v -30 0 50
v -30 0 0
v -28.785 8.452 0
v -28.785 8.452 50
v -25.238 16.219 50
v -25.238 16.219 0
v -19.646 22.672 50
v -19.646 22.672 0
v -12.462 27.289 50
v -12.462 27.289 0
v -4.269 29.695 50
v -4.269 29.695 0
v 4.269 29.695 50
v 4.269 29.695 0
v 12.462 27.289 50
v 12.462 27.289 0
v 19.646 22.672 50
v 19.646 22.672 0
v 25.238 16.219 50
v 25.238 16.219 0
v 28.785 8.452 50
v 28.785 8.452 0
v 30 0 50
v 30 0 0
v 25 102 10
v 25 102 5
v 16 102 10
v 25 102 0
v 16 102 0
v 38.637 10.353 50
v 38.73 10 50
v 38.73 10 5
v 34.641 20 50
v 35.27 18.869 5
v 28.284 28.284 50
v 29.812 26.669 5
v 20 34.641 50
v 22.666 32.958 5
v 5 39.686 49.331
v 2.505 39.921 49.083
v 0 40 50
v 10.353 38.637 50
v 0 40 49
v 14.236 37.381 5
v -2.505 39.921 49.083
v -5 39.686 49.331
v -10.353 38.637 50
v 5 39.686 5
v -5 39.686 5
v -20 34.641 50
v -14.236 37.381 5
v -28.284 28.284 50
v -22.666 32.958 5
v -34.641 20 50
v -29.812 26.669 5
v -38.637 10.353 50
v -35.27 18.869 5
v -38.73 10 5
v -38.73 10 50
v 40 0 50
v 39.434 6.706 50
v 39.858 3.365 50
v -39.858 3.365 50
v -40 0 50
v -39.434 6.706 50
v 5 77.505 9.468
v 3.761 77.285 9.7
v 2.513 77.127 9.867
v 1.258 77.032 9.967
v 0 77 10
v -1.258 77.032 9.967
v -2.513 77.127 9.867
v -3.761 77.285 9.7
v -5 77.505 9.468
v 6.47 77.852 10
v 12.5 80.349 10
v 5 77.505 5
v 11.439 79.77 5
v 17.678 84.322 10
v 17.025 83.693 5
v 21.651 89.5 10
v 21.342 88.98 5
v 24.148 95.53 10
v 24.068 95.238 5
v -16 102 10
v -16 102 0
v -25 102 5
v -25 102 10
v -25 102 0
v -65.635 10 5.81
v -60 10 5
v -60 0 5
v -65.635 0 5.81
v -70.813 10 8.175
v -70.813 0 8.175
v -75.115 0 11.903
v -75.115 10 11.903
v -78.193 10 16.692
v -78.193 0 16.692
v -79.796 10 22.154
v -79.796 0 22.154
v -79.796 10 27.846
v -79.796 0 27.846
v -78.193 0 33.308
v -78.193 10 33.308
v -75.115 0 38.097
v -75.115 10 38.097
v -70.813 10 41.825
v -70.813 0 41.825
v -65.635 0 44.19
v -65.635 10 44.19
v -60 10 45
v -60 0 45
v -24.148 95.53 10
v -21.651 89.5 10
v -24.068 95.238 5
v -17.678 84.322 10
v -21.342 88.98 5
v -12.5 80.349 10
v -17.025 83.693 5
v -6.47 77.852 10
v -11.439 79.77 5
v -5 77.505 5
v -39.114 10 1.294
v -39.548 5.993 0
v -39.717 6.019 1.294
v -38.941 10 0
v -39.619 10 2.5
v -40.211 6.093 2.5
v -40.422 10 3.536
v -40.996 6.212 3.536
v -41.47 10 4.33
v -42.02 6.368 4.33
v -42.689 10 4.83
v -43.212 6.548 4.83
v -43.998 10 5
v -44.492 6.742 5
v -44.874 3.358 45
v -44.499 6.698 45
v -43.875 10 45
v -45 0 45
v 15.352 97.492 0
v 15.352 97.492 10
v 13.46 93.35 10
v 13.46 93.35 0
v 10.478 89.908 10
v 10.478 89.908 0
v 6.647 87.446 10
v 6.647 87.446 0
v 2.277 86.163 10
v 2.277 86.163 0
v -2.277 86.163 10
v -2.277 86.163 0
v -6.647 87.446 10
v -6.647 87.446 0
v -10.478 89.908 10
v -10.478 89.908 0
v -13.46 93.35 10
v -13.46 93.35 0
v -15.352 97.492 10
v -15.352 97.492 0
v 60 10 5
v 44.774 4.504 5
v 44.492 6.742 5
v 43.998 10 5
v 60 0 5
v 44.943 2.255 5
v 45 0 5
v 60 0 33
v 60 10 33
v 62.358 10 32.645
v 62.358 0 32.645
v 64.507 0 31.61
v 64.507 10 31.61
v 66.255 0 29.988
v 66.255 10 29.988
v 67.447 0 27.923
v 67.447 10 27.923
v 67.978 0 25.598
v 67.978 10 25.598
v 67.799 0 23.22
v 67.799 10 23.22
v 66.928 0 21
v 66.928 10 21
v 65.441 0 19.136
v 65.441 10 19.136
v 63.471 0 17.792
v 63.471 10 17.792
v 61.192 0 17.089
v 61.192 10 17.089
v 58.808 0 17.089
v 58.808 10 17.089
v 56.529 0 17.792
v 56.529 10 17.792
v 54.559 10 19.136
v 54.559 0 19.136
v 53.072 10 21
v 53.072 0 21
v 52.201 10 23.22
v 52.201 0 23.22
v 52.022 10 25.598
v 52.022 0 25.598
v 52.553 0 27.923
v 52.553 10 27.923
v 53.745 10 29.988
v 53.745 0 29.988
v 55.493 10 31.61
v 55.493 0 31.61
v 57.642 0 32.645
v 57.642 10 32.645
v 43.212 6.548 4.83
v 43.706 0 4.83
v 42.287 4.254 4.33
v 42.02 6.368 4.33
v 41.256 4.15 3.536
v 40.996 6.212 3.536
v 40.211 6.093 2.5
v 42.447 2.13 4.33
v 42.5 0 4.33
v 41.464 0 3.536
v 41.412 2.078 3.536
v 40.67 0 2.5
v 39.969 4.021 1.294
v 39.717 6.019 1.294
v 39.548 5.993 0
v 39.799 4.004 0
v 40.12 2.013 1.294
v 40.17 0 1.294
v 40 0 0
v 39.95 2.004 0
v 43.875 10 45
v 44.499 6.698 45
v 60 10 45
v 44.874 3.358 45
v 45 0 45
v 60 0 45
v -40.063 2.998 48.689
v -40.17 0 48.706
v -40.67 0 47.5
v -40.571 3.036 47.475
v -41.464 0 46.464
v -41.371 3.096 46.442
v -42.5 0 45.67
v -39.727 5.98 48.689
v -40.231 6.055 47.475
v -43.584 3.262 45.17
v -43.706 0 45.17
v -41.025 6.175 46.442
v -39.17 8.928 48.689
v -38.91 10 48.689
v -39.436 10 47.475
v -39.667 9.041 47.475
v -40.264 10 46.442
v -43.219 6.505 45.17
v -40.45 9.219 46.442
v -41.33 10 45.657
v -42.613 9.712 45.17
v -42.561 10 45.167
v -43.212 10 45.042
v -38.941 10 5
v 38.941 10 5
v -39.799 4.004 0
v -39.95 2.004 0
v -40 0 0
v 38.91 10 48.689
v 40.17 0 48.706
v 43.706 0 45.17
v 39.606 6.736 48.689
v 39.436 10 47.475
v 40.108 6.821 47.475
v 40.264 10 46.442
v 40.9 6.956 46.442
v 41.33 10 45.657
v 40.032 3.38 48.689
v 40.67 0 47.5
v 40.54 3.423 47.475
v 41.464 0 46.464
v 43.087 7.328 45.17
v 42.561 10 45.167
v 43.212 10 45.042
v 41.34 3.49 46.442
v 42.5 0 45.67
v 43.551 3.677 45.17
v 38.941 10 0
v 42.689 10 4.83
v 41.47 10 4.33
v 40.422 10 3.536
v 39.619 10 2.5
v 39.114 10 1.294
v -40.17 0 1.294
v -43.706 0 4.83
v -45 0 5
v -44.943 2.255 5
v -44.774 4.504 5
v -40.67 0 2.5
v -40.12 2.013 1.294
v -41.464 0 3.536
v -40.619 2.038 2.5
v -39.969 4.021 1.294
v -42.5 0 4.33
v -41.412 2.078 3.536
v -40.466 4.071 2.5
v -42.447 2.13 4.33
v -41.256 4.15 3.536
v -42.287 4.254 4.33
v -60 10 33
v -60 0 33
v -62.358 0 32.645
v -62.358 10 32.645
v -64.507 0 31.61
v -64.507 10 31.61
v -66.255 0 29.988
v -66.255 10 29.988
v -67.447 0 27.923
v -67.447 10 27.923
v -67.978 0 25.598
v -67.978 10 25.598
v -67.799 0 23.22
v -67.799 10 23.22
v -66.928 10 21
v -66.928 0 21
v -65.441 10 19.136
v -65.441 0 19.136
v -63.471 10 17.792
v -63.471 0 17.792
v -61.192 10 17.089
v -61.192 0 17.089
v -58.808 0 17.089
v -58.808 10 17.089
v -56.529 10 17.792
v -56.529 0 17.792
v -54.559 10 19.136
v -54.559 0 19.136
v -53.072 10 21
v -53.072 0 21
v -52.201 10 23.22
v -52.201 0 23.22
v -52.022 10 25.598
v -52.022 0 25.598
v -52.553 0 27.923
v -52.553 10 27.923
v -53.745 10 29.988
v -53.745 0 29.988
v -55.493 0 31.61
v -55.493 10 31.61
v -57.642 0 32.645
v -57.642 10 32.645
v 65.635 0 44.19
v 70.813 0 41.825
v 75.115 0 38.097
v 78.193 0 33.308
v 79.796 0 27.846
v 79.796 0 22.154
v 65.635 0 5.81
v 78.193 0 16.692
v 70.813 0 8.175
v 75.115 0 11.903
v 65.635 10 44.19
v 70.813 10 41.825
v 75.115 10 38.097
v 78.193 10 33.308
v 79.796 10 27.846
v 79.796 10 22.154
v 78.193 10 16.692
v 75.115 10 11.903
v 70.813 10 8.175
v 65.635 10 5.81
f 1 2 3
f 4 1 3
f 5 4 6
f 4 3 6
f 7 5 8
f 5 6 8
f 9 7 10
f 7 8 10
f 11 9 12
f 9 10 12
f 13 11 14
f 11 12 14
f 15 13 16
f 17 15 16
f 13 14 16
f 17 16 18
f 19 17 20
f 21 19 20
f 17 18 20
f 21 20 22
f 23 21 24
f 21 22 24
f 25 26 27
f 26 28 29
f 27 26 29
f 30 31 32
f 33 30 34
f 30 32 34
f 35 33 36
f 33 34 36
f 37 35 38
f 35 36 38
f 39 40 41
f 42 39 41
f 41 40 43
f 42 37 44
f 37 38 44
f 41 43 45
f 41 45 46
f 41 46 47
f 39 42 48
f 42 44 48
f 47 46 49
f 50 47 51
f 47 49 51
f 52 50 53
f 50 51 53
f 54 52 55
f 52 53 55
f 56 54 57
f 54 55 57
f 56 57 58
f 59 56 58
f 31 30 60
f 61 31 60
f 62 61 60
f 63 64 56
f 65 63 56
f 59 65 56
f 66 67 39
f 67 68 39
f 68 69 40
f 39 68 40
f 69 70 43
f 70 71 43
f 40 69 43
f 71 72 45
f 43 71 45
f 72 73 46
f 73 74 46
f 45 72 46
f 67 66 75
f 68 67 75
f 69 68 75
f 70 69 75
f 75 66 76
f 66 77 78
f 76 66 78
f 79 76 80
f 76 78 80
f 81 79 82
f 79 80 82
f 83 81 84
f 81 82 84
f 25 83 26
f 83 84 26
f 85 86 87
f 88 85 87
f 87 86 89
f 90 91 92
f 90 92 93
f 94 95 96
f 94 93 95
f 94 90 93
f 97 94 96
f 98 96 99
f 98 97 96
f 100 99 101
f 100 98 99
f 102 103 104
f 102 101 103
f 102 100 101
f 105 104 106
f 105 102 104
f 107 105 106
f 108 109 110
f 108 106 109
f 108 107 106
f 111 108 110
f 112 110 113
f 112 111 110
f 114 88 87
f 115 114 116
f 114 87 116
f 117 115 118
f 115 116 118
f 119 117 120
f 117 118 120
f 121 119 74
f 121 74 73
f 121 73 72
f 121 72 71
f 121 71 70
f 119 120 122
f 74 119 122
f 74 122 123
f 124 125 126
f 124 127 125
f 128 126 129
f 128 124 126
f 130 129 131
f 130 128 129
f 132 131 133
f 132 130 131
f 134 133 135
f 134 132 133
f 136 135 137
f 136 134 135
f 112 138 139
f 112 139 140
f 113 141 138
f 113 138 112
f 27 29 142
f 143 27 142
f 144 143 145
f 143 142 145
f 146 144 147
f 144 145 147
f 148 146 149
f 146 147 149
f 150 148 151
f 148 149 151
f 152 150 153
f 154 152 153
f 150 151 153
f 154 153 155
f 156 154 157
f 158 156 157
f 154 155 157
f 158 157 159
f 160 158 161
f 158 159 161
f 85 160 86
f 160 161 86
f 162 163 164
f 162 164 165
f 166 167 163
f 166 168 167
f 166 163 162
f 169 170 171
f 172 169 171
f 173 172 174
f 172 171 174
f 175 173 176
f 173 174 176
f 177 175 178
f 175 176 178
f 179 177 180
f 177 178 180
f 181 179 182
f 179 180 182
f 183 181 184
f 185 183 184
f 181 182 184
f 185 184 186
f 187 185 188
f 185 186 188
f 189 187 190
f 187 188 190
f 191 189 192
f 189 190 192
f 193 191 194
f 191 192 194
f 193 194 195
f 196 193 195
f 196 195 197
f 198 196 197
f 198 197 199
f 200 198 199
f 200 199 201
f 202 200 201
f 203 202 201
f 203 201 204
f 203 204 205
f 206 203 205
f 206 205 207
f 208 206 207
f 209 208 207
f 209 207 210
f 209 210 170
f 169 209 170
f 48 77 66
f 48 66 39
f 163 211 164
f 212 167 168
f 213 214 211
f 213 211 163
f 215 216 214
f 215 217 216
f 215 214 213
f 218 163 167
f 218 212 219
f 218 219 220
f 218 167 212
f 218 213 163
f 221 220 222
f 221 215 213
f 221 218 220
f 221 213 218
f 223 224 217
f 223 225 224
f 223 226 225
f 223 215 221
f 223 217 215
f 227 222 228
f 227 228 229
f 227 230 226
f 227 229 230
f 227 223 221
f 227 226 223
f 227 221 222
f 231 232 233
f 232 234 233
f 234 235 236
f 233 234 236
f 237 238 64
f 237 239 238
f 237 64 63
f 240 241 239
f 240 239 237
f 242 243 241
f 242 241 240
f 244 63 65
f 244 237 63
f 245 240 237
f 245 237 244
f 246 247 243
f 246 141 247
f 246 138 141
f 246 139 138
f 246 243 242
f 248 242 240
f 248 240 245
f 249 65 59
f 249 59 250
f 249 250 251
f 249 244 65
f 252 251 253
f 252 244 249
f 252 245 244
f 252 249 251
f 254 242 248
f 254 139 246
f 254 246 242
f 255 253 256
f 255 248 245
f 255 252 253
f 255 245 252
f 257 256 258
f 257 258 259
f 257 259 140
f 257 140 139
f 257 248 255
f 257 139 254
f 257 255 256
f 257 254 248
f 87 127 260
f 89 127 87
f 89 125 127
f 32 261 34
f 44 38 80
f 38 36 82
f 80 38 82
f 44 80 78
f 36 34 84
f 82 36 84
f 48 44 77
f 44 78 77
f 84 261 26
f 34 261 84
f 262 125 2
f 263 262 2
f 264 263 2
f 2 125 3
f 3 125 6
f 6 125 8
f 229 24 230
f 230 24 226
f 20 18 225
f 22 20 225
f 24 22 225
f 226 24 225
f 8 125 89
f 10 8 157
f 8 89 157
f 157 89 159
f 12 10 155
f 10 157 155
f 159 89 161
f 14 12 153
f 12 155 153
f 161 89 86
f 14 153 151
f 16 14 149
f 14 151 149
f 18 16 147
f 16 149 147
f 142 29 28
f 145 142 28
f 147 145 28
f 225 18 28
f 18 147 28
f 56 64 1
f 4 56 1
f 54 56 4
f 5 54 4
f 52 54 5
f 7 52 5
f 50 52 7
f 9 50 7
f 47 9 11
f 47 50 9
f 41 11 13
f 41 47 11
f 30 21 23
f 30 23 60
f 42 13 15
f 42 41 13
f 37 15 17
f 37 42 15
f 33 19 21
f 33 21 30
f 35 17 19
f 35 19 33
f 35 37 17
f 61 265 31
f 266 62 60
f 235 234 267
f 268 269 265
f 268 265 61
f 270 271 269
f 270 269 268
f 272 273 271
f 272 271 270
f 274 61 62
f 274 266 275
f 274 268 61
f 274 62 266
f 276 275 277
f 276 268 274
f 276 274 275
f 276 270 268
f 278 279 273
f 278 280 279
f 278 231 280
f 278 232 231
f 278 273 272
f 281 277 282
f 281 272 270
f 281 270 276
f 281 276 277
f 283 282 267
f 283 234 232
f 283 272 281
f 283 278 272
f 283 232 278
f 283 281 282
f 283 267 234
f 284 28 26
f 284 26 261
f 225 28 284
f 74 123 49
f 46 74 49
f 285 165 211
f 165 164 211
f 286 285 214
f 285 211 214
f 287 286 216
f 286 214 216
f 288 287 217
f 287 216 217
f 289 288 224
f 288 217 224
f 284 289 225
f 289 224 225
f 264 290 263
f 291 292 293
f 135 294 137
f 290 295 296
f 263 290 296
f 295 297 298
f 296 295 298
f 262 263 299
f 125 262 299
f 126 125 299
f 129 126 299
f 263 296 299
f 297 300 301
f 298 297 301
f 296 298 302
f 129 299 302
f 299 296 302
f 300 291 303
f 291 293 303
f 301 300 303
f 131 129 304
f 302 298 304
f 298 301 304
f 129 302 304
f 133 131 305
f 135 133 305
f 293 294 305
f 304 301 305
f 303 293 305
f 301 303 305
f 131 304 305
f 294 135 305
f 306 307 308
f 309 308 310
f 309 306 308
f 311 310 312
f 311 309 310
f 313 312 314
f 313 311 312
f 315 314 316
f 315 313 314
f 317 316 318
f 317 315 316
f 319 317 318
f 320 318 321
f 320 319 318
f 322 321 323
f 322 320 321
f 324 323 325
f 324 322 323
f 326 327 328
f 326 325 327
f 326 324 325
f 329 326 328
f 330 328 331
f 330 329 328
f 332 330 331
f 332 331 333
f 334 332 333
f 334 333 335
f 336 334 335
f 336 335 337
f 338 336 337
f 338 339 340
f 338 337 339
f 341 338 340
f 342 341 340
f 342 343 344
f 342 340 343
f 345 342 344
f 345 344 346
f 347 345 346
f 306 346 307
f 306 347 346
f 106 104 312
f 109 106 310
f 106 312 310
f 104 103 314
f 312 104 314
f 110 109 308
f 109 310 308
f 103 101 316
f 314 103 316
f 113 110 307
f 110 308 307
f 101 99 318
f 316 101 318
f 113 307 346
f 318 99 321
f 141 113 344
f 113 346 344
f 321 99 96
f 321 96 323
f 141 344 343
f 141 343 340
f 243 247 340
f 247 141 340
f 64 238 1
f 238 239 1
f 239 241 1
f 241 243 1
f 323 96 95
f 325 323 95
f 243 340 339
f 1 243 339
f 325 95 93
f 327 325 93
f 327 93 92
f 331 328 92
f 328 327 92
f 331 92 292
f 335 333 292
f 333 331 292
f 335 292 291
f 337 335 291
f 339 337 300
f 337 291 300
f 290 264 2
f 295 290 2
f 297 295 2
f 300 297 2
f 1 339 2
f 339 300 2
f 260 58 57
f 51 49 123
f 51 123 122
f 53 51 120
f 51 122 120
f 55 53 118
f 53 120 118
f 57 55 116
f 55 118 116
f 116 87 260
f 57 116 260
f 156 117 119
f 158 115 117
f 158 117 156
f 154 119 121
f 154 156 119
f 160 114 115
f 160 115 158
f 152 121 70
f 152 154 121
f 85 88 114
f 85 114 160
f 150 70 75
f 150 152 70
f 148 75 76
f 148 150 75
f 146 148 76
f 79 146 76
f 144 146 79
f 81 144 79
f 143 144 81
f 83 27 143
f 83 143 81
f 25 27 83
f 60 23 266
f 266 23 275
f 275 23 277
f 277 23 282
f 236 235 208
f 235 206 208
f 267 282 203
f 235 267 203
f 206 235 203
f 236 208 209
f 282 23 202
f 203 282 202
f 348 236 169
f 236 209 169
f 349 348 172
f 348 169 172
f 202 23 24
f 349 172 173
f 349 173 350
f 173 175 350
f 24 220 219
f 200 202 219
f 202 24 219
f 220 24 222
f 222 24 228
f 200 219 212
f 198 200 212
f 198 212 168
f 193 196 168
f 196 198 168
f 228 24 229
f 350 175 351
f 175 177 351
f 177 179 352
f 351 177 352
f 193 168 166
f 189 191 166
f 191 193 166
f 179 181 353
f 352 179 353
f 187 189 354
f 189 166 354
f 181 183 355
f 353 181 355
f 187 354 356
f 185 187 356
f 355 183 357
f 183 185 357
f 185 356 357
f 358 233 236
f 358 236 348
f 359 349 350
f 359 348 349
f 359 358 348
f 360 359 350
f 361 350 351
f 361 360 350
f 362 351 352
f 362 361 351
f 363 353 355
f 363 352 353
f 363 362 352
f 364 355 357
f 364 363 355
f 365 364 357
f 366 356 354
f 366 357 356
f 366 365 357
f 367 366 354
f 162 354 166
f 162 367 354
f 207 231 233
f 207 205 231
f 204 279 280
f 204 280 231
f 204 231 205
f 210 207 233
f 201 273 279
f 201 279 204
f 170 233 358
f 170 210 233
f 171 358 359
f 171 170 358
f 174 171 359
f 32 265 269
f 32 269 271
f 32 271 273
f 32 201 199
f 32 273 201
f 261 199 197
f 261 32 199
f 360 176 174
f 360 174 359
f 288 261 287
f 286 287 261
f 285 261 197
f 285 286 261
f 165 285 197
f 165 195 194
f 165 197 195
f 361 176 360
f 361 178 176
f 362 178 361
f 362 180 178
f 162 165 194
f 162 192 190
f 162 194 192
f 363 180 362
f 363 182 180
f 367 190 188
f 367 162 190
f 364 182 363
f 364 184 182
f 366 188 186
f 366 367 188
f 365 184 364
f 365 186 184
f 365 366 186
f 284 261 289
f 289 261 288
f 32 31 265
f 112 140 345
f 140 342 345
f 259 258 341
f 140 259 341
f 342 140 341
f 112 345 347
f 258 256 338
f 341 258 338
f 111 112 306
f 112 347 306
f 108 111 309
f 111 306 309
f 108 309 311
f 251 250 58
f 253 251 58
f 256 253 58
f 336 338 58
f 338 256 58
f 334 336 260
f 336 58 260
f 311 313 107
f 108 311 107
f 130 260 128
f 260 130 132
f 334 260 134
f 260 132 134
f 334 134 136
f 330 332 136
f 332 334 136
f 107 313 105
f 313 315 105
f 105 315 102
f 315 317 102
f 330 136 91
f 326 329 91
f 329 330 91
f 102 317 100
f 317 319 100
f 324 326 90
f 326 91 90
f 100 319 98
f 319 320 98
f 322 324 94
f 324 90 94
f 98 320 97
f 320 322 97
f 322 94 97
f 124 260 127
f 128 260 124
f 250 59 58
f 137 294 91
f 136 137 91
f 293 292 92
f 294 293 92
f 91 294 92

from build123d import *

# Parameters (mm, degrees)
EXTRUDE_THIN1_DEPTH         = 50
BOSS_EXTRUDE1_DEPTH         = 5
EXTRUDE_THIN3_DEPTH         = 5
EXTRUDE_THIN3_DEPTH_BACK    = 5
RIB6_REACH                  = 122.433
SKETCH4_WALL_W              = 296.6238277
SKETCH4_WALL_H              = 10
SKETCH5_W                   = 50
SKETCH5_H                   = 40
BOSS_EXTRUDE2_DEPTH         = 10
FILLET1_RADIUS              = 20
FILLET1_LENGTH              = 10
SKETCH6_R                   = 8
CUT_EXTRUDE1_DEPTH          = 132.77253128
FILLET2_R                   = 5
FILLET1_OF_MIRROR1_2_RADIUS = 20
FILLET1_OF_MIRROR1_2_LENGTH = 10
FILLET2_OF_MIRROR1_R        = 5


with BuildPart() as part:
    # Sketch1 → Extrude-Thin1 (new body)
    with BuildSketch(Plane.XY):
        with BuildLine():
            ThreePointArc((40, 0), (0, 40), (-40, 0))
            Line((-40, 0), (-30, 0))
            ThreePointArc((-30, 0), (0, 30), (30, 0))
            Line((30, 0), (40, 0))
        make_face()
    extrude(amount=EXTRUDE_THIN1_DEPTH)

    # Sketch2 → Boss-Extrude1 (add)
    with BuildSketch(Plane.XY):
        with BuildLine():
            Line((-30, 0), (-40, 0))
            ThreePointArc((-40, 0), (-39.886965034, 3.004999227), (-39.548498982, 5.993014955))
            Line((-39.548498982, 5.993014955), (-25, 102))
            ThreePointArc((-25, 102), (0, 77), (25, 102))
            Line((25, 102), (39.548498982, 5.993014955))
            ThreePointArc((39.548498982, 5.993014955), (39.886965034, 3.004999227), (40, 0))
            Line((40, 0), (30, 0))
            ThreePointArc((30, 0), (0, 30), (-30, 0))
        make_face()
    extrude(amount=BOSS_EXTRUDE1_DEPTH)

    # Sketch3 → Extrude-Thin3 (add, two sides: drawn at the far end of the back side and taken through both)
    with BuildSketch(Plane.XY.offset(5).offset(-EXTRUDE_THIN3_DEPTH_BACK)):
        with BuildLine():
            ThreePointArc((-25, 102), (0, 77), (25, 102))
            Line((25, 102), (16, 102))
            ThreePointArc((16, 102), (0, 86), (-16, 102))
            Line((-16, 102), (-25, 102))
        make_face()
    extrude(amount=EXTRUDE_THIN3_DEPTH + EXTRUDE_THIN3_DEPTH_BACK)

    # Sketch4 wall → Rib6 (add, up to next)
    with BuildSketch(Plane(origin=(0, 58.5, 29.5), x_dir=(0, -0.688260431919, 0.725463698509), z_dir=(0, -0.725463698509, -0.688260431919)), mode=Mode.PRIVATE) as rib6_sk1:
        Rectangle(SKETCH4_WALL_W, SKETCH4_WALL_H)
    rib6_tool1 = extrude(rib6_sk1.sketch, amount=RIB6_REACH, mode=Mode.PRIVATE) - part.part
    add(rib6_tool1.solids().sort_by_distance((0, 58.5, 29.5))[0])

    # Sketch5 → Boss-Extrude2 (add)
    with BuildSketch(Plane(origin=(0, 0, 0), x_dir=(1, 0, 0), z_dir=(0, 1, 0))):
        with Locations((55, -25)):
            Rectangle(SKETCH5_W, SKETCH5_H)
    boss_extrude2 = extrude(amount=BOSS_EXTRUDE2_DEPTH)

    # Fillet1: full round fillet: the end face becomes a half cylinder, R = half its width
    fillet1_face = Plane((80, 5, 25), x_dir=(0, 1, 0), z_dir=(1, 0, 0))  # on the end face: x along it, z out of the body
    fillet1_slab = fillet1_face.offset(-FILLET1_RADIUS / 2) * Box(FILLET1_LENGTH, 2 * FILLET1_RADIUS, FILLET1_RADIUS, mode=Mode.PRIVATE)  # the body's end, R deep
    fillet1_round = Plane((60, 5, 25), x_dir=(1, 0, 0), z_dir=(0, 1, 0)) * Cylinder(FILLET1_RADIUS, FILLET1_LENGTH, mode=Mode.PRIVATE)  # its axis R under the face
    add(fillet1_slab - fillet1_round, mode=Mode.SUBTRACT)

    # Sketch6 → Cut-Extrude1 (cut, through all)
    with BuildSketch(Plane(origin=(0, 10, 0), x_dir=(1, 0, 0), z_dir=(0, 1, 0))):
        with Locations(Location((60, -25, 0), (0, 0, 270))):
            Circle(SKETCH6_R)
    cut_extrude1 = extrude(amount=-CUT_EXTRUDE1_DEPTH, mode=Mode.SUBTRACT)

    # Fillet2
    fillet2_edges = [part.edges().sort_by_distance(p)[0] for p in [
        (39.244898063, 7.996507478, 5),
        (39.886965034, 3.004999227, 5),
        (39.681187851, 5.040171699, 45),
    ]]
    fillet(fillet2_edges, radius=FILLET2_R - 0.0001)  # a hair under: the kernel refuses the full size

    # Mirror1: Boss-Extrude2, Cut-Extrude1 across plane
    add(boss_extrude2.mirror(Plane(origin=(0, 0, 0), x_dir=(0, 0, 1), z_dir=(1, 0, 0))))
    add(cut_extrude1.mirror(Plane(origin=(0, 0, 0), x_dir=(0, 0, 1), z_dir=(1, 0, 0))), mode=Mode.SUBTRACT)

    # Fillet1 of Mirror1 2: full round fillet: the end face becomes a half cylinder, R = half its width
    fillet1_of_mirror1_2_face = Plane((-80, 5, 25), x_dir=(0, 1, 0), z_dir=(-1, 0, 0))  # on the end face: x along it, z out of the body
    fillet1_of_mirror1_2_slab = fillet1_of_mirror1_2_face.offset(-FILLET1_OF_MIRROR1_2_RADIUS / 2) * Box(FILLET1_OF_MIRROR1_2_LENGTH, 2 * FILLET1_OF_MIRROR1_2_RADIUS, FILLET1_OF_MIRROR1_2_RADIUS, mode=Mode.PRIVATE)  # the body's end, R deep
    fillet1_of_mirror1_2_round = Plane((-60, 5, 25), x_dir=(-1, 0, 0), z_dir=(0, 1, 0)) * Cylinder(FILLET1_OF_MIRROR1_2_RADIUS, FILLET1_OF_MIRROR1_2_LENGTH, mode=Mode.PRIVATE)  # its axis R under the face
    add(fillet1_of_mirror1_2_slab - fillet1_of_mirror1_2_round, mode=Mode.SUBTRACT)

    # Fillet2 of Mirror1
    fillet2_of_mirror1_edges = [part.edges().sort_by_distance(p)[0] for p in [
        (-39.244898063, 7.996507478, 5),
        (-39.886965034, 3.004999227, 5),
        (-39.681187851, 5.040171699, 45),
    ]]
    fillet(fillet2_of_mirror1_edges, radius=FILLET2_OF_MIRROR1_R - 0.0001)  # a hair under: the kernel refuses the full size


solid = part.part
